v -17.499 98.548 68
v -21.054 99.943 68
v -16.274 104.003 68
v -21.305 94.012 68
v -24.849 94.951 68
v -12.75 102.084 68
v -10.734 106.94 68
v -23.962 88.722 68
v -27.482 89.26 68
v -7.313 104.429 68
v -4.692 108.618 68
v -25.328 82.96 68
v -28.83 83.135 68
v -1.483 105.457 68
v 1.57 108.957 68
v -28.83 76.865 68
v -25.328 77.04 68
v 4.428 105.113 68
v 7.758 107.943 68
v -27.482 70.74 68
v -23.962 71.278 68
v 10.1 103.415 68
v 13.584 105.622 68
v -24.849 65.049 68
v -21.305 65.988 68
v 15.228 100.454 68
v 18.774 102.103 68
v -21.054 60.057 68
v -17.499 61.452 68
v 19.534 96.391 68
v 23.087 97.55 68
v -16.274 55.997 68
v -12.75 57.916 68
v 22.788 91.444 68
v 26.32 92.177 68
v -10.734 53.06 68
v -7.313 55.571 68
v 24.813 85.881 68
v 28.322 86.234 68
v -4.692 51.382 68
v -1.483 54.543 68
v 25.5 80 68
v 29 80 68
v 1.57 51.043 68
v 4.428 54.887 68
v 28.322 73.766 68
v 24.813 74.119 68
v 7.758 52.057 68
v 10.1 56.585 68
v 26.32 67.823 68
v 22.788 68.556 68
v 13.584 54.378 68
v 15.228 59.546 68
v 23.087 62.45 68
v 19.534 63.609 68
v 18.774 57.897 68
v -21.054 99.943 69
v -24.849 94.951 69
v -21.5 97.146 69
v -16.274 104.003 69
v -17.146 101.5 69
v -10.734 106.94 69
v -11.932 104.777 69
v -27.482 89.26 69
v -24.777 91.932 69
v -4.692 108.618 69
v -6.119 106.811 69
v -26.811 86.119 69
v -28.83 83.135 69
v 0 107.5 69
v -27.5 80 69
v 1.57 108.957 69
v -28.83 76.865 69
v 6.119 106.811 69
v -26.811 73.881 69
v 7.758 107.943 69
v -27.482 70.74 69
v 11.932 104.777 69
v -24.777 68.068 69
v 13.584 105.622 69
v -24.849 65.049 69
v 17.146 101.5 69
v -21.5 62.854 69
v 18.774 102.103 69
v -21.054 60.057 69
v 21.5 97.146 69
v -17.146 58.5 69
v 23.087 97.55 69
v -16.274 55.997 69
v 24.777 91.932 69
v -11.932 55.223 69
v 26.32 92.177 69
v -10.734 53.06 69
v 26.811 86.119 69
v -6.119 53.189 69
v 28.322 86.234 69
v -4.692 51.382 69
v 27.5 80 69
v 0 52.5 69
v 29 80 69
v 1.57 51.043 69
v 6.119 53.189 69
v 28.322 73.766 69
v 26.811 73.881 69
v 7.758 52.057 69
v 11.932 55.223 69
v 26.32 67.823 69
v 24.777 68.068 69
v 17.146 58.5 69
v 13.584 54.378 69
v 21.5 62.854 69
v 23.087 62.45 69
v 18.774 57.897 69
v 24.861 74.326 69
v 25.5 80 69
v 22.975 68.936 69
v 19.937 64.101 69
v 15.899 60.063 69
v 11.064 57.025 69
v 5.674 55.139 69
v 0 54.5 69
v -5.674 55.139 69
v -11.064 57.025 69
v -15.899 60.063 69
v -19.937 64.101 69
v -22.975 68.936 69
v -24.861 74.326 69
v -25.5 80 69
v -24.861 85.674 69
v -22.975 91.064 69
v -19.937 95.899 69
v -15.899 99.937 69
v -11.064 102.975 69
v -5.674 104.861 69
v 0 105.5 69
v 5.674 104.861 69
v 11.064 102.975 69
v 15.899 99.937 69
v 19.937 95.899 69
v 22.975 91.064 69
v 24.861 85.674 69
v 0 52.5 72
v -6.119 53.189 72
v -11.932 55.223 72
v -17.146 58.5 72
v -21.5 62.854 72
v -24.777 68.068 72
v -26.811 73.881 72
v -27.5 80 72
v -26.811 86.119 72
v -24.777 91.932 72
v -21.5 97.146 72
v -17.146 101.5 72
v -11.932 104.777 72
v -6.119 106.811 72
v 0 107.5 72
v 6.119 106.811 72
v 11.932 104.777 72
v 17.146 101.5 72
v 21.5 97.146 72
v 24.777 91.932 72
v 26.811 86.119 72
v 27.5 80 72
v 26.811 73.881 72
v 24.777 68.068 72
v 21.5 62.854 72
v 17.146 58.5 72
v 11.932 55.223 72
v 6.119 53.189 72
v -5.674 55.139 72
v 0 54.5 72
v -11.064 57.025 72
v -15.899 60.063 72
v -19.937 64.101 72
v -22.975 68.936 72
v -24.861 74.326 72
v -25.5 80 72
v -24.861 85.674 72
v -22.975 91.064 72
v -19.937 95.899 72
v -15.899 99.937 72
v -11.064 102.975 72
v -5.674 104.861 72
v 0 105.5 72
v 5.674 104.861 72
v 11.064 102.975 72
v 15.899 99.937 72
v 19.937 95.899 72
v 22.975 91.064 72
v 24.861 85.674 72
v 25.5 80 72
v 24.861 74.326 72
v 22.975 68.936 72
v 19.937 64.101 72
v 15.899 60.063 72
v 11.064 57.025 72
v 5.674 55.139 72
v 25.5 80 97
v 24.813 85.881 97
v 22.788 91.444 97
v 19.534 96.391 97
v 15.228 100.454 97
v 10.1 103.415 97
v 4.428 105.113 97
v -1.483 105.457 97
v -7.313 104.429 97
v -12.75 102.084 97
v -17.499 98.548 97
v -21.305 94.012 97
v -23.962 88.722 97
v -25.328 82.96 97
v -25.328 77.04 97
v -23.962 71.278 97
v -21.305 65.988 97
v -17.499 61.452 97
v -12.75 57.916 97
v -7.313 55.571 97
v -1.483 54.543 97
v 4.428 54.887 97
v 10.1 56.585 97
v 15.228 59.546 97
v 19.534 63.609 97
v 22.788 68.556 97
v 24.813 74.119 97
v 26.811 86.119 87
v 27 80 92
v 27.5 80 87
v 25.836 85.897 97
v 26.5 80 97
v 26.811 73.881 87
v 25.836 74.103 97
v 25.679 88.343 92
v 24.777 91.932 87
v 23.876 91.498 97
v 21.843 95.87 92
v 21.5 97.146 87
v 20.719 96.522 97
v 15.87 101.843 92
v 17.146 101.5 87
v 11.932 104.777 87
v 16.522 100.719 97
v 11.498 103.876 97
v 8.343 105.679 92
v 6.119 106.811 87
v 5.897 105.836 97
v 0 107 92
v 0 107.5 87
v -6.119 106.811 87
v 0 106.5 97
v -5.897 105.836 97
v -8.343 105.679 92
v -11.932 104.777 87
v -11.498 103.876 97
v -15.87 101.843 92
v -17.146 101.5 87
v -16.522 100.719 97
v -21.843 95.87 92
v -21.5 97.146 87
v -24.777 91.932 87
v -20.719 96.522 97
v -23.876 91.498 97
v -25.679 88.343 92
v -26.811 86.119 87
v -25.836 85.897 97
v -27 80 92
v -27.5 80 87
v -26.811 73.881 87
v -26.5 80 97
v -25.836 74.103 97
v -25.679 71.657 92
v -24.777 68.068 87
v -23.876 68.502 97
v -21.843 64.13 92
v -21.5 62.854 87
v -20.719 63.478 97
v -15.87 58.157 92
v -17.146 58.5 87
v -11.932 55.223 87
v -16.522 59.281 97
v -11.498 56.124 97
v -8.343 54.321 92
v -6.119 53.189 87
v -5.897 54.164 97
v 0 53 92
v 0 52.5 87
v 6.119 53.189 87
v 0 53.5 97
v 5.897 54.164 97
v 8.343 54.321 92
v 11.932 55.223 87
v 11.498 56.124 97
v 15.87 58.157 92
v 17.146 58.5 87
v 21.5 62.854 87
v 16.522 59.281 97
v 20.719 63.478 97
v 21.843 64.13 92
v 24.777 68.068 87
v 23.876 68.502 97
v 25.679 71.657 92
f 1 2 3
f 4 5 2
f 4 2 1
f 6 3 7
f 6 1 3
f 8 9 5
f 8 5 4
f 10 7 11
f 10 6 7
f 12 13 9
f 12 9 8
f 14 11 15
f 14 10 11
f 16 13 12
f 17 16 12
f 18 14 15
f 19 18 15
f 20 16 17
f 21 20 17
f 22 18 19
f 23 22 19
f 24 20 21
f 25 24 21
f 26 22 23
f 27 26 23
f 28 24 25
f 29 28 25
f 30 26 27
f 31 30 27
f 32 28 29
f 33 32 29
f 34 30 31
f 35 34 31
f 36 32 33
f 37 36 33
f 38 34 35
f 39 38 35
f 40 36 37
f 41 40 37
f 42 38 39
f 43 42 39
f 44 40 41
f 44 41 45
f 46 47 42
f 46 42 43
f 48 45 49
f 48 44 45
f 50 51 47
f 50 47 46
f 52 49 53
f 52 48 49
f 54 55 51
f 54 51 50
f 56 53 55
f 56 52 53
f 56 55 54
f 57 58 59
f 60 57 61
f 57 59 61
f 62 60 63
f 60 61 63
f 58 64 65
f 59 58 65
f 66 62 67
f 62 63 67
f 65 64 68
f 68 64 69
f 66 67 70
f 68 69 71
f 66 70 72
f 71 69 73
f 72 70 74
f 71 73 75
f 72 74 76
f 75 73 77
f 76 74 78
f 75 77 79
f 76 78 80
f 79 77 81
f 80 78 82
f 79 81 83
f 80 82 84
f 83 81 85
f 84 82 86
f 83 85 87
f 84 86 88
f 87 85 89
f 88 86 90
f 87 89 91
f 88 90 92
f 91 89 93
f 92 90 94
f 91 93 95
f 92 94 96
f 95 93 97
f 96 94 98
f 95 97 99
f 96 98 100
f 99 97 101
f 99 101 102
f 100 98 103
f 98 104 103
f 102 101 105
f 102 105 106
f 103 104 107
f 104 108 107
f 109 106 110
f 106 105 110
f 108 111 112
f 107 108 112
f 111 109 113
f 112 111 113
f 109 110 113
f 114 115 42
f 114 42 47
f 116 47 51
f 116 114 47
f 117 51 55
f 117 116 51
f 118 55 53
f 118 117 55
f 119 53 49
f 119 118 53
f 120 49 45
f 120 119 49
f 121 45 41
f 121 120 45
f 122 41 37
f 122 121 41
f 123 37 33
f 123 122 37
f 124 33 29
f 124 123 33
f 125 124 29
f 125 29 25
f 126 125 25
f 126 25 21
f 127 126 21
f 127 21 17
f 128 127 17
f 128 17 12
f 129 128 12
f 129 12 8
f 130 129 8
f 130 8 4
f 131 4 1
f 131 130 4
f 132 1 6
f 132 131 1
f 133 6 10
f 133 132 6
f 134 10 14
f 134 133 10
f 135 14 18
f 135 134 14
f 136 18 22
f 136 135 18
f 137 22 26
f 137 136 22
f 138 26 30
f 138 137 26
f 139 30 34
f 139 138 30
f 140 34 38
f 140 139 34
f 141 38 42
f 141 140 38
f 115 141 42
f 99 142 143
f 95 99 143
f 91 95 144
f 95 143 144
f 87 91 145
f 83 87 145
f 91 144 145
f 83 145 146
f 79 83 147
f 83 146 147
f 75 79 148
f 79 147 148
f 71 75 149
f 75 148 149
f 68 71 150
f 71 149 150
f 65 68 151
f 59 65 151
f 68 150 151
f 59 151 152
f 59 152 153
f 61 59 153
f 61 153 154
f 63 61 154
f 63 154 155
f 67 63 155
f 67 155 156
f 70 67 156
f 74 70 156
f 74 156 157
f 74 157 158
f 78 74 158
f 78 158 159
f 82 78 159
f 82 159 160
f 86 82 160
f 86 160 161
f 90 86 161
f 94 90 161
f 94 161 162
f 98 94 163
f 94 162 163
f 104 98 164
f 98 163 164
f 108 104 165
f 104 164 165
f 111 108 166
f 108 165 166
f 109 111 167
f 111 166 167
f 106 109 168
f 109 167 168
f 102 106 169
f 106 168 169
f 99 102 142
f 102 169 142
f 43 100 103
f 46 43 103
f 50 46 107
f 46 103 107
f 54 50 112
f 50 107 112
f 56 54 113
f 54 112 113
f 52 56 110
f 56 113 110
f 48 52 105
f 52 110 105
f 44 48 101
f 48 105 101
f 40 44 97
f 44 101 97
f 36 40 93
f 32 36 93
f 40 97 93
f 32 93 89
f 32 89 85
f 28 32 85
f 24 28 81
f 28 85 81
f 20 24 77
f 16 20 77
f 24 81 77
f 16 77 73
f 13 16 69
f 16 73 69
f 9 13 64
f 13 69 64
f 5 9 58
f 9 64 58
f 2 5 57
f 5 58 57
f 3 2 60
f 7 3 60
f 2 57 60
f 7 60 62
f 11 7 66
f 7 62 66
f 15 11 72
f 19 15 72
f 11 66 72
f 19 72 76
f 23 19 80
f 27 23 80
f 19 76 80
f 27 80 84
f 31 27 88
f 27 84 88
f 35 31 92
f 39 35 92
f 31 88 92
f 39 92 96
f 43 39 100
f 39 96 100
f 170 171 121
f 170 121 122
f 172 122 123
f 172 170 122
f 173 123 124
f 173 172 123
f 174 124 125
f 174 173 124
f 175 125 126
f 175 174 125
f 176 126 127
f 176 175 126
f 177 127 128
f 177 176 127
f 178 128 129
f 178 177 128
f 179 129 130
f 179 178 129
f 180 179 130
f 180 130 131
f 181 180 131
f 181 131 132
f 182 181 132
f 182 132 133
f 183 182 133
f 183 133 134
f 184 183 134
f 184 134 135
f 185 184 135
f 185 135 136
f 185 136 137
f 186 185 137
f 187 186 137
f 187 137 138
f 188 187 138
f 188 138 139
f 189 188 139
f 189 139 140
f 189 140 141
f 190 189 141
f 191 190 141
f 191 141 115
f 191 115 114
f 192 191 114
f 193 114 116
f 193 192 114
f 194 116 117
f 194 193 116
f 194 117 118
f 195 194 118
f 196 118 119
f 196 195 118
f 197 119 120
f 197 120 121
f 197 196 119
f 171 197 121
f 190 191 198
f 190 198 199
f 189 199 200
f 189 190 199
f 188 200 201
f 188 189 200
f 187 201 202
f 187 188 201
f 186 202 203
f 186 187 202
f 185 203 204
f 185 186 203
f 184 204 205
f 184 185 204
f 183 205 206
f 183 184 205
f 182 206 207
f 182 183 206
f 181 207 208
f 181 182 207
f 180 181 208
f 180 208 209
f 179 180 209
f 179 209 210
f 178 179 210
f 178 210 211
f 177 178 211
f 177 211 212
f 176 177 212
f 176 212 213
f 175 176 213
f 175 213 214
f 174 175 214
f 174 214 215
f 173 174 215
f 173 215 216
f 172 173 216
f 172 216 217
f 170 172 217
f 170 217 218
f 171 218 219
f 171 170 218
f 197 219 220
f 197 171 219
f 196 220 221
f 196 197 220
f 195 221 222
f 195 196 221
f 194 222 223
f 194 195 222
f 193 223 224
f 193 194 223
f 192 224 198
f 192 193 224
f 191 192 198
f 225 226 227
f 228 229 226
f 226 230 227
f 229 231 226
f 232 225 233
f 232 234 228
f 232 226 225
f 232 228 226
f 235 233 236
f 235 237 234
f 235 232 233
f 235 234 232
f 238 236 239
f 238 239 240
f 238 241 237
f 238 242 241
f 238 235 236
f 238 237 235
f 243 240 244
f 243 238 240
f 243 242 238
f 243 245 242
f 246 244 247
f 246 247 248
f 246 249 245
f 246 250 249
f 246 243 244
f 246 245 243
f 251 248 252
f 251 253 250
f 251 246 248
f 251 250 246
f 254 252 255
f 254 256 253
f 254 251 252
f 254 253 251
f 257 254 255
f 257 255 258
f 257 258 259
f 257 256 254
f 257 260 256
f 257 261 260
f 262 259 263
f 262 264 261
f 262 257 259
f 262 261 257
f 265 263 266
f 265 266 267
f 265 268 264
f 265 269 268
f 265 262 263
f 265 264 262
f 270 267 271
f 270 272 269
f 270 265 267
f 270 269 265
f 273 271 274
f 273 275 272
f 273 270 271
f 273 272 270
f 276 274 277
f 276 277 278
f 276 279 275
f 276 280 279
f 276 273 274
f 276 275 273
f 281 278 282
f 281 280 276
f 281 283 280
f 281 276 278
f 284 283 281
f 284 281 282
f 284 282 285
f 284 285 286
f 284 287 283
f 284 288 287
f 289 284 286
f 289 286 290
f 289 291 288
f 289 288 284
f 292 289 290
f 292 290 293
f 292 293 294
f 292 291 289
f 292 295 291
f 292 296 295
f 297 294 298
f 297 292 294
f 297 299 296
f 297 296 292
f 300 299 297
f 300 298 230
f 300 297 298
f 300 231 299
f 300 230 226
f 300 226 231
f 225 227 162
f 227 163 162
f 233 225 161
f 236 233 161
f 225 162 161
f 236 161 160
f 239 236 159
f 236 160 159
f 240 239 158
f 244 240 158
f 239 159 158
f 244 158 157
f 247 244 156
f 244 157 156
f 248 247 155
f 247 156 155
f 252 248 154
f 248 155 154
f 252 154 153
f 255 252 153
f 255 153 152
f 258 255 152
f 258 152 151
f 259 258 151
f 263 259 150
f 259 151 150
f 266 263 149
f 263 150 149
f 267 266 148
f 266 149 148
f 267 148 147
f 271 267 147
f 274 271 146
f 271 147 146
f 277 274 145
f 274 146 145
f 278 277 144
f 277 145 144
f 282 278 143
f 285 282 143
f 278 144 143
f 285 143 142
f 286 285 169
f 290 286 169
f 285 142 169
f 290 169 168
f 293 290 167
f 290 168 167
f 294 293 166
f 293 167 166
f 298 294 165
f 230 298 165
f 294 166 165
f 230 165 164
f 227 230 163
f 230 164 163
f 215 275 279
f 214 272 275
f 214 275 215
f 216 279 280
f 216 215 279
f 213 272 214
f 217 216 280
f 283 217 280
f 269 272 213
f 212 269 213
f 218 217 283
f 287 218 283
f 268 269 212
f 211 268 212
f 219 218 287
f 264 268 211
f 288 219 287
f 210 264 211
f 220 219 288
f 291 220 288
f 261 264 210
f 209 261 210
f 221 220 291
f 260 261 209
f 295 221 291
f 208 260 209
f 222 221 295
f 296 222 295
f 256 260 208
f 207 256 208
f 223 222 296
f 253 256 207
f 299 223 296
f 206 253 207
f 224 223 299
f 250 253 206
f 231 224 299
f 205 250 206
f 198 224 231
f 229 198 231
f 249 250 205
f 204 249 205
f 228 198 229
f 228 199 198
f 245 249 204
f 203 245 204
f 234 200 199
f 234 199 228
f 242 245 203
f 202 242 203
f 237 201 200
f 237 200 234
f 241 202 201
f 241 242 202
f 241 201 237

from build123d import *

# Parameters (mm, degrees)
SKETCH011_R          = 27.5
SKETCH011_R_2        = 25.5
PAD001_DEPTH         = 25
CHAMFER002_SIZE2     = 1
CHAMFER002_SIZE      = 10
CHAMFER002_FACE3_R   = 27.5
CHAMFER002_FACE3_R_2 = 25.5
PAD002_DEPTH         = 3
SKETCH012_R          = 29
SKETCH012_R_2        = 25.5
PAD003_DEPTH         = 1


with BuildPart() as part:
    # Sketch011 (on Face1 of CopyChamfer001) → Pad001 (new body)
    with BuildSketch(Plane.XY.offset(72)):
        with Locations((0, 80)):
            Circle(SKETCH011_R)
        with Locations((0, 80)):
            Circle(SKETCH011_R_2, mode=Mode.SUBTRACT)
    extrude(amount=PAD001_DEPTH)

    # Chamfer002
    chamfer002_edges = [part.edges().sort_by_distance(p)[0] for p in [
        (-27.5, 80, 97),
    ]]
    chamfer002_side = part.faces().sort_by_distance((-27.5, 80, 84.5))[0]
    chamfer(chamfer002_edges, length=CHAMFER002_SIZE, length2=CHAMFER002_SIZE2, reference=chamfer002_side)

    # Chamfer002 Face3 → Pad002 (add)
    with BuildSketch(Plane(origin=(0, 80, 72), x_dir=(0, -1, 0), z_dir=(0, 0, -1))):
        Circle(CHAMFER002_FACE3_R)
        Circle(CHAMFER002_FACE3_R_2, mode=Mode.SUBTRACT)
    extrude(amount=PAD002_DEPTH)

    # Sketch012 (on Face5 of Pad002) → Pad003 (join)
    with BuildSketch(Plane(origin=(0, 0, 69), x_dir=(1, 0, 0), z_dir=(0, 0, -1))):
        with Locations((0, -80)):
            Circle(SKETCH012_R)
        with Locations((0, -80)):
            Circle(SKETCH012_R_2, mode=Mode.SUBTRACT)
    extrude(amount=PAD003_DEPTH)


solid = part.part
